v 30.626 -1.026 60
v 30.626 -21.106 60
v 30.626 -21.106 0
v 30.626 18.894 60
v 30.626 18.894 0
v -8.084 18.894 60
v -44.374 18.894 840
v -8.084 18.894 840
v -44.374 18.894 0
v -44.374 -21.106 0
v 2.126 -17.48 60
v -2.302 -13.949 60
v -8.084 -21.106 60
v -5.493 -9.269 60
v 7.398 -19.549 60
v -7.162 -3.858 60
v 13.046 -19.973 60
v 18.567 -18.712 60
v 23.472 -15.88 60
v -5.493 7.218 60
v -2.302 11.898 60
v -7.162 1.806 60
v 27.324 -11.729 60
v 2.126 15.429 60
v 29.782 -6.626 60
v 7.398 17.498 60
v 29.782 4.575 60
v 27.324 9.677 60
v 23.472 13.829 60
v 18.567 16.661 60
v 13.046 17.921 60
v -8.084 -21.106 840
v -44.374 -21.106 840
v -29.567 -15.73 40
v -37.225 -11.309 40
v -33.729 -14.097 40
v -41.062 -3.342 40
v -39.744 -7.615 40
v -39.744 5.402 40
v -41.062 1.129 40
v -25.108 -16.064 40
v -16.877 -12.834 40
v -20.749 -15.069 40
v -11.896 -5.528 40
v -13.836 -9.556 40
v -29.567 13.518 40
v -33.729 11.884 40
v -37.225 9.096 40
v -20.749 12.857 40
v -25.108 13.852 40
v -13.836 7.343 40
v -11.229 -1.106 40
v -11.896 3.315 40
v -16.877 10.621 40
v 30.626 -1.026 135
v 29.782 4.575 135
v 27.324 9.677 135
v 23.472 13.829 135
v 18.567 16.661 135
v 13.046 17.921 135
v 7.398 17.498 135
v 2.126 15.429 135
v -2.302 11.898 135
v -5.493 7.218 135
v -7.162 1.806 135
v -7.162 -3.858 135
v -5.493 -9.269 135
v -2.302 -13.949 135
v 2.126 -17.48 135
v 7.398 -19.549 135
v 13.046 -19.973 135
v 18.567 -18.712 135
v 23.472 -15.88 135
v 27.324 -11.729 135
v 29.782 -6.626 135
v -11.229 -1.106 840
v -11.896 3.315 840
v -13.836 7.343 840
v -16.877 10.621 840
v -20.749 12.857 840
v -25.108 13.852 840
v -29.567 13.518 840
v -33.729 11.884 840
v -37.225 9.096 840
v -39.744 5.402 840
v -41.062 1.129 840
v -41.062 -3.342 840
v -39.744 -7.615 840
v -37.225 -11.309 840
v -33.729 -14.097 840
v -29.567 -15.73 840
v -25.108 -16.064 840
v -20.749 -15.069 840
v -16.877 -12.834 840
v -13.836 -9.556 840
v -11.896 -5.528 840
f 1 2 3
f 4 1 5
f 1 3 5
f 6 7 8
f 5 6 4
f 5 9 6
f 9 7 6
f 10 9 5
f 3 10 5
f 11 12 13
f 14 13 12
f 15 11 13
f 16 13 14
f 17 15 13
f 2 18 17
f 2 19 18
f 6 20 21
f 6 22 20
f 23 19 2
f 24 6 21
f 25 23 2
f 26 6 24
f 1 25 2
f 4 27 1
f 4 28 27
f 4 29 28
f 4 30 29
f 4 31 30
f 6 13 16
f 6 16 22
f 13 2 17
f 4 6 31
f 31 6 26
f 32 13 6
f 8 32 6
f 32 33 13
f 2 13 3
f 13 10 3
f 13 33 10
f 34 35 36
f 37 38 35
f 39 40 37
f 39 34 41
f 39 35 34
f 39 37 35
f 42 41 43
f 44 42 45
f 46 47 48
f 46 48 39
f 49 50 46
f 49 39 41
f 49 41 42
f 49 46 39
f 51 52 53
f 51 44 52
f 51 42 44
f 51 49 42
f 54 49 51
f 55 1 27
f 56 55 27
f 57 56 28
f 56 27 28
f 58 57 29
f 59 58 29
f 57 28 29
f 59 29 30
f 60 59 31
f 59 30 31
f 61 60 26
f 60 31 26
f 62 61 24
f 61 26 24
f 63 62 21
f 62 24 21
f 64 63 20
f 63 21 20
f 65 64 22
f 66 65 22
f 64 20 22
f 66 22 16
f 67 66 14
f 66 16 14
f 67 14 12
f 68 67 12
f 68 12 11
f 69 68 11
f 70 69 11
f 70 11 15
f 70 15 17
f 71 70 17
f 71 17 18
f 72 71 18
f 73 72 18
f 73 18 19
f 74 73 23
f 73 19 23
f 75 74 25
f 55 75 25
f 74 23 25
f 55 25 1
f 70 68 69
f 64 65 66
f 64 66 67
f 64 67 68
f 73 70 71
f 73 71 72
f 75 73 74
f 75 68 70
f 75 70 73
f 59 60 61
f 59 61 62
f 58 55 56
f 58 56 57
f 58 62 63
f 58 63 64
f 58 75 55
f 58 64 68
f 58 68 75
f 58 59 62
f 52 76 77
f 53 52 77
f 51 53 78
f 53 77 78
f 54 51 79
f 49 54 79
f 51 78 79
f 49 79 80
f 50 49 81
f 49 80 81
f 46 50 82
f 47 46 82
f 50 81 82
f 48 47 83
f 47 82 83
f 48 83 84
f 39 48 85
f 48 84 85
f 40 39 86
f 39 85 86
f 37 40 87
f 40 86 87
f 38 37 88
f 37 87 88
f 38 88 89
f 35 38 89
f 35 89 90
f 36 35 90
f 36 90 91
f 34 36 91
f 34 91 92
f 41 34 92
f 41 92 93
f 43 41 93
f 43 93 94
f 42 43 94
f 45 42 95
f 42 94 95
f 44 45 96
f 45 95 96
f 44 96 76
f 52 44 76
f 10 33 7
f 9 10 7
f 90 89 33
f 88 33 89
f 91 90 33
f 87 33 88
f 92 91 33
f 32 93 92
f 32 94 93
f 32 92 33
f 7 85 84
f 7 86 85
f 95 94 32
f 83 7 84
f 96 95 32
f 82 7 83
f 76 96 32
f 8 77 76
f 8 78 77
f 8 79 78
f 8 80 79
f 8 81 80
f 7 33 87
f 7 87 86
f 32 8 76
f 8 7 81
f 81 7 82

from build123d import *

# Parameters (mm, degrees)
SKETCH_1_W          = 75
SKETCH_1_H          = 40
EXTRUDE_1_DEPTH     = 60
SKETCH_2_R          = 19
EXTRUDE_2_DEPTH     = 75
SKETCH_3_W          = 36.2897677
SKETCH_3_H          = 40
EXTRUDE_3_DEPTH     = 780
SKETCH_7_R          = 15
CUT_EXTRUDE_1_DEPTH = 800


with BuildPart() as part:
    # 草圖1 → 填料-伸長1 (new body)
    with BuildSketch(Plane.XY):
        with Locations((-6.874209628, -1.106382979)):
            Rectangle(SKETCH_1_W, SKETCH_1_H)
    extrude(amount=EXTRUDE_1_DEPTH)

    # 草圖2 → 填料-伸長2 (add)
    with BuildSketch(Plane.XY.offset(60)):
        with Locations((11.625790372, -1.025700825)):
            Circle(SKETCH_2_R)
    extrude(amount=EXTRUDE_2_DEPTH)

    # 草圖3 → 填料-伸長3 (add)
    with BuildSketch(Plane.XY.offset(60)):
        with Locations((-26.229325778, -1.106382979)):
            Rectangle(SKETCH_3_W, SKETCH_3_H)
    extrude(amount=EXTRUDE_3_DEPTH)

    # 草圖7 → 除料-伸長1 (cut)
    with BuildSketch(Plane.XY.offset(840)):
        with Locations((-26.229325778, -1.106382979)):
            Circle(SKETCH_7_R)
    extrude(amount=-CUT_EXTRUDE_1_DEPTH, mode=Mode.SUBTRACT)


solid = part.part
